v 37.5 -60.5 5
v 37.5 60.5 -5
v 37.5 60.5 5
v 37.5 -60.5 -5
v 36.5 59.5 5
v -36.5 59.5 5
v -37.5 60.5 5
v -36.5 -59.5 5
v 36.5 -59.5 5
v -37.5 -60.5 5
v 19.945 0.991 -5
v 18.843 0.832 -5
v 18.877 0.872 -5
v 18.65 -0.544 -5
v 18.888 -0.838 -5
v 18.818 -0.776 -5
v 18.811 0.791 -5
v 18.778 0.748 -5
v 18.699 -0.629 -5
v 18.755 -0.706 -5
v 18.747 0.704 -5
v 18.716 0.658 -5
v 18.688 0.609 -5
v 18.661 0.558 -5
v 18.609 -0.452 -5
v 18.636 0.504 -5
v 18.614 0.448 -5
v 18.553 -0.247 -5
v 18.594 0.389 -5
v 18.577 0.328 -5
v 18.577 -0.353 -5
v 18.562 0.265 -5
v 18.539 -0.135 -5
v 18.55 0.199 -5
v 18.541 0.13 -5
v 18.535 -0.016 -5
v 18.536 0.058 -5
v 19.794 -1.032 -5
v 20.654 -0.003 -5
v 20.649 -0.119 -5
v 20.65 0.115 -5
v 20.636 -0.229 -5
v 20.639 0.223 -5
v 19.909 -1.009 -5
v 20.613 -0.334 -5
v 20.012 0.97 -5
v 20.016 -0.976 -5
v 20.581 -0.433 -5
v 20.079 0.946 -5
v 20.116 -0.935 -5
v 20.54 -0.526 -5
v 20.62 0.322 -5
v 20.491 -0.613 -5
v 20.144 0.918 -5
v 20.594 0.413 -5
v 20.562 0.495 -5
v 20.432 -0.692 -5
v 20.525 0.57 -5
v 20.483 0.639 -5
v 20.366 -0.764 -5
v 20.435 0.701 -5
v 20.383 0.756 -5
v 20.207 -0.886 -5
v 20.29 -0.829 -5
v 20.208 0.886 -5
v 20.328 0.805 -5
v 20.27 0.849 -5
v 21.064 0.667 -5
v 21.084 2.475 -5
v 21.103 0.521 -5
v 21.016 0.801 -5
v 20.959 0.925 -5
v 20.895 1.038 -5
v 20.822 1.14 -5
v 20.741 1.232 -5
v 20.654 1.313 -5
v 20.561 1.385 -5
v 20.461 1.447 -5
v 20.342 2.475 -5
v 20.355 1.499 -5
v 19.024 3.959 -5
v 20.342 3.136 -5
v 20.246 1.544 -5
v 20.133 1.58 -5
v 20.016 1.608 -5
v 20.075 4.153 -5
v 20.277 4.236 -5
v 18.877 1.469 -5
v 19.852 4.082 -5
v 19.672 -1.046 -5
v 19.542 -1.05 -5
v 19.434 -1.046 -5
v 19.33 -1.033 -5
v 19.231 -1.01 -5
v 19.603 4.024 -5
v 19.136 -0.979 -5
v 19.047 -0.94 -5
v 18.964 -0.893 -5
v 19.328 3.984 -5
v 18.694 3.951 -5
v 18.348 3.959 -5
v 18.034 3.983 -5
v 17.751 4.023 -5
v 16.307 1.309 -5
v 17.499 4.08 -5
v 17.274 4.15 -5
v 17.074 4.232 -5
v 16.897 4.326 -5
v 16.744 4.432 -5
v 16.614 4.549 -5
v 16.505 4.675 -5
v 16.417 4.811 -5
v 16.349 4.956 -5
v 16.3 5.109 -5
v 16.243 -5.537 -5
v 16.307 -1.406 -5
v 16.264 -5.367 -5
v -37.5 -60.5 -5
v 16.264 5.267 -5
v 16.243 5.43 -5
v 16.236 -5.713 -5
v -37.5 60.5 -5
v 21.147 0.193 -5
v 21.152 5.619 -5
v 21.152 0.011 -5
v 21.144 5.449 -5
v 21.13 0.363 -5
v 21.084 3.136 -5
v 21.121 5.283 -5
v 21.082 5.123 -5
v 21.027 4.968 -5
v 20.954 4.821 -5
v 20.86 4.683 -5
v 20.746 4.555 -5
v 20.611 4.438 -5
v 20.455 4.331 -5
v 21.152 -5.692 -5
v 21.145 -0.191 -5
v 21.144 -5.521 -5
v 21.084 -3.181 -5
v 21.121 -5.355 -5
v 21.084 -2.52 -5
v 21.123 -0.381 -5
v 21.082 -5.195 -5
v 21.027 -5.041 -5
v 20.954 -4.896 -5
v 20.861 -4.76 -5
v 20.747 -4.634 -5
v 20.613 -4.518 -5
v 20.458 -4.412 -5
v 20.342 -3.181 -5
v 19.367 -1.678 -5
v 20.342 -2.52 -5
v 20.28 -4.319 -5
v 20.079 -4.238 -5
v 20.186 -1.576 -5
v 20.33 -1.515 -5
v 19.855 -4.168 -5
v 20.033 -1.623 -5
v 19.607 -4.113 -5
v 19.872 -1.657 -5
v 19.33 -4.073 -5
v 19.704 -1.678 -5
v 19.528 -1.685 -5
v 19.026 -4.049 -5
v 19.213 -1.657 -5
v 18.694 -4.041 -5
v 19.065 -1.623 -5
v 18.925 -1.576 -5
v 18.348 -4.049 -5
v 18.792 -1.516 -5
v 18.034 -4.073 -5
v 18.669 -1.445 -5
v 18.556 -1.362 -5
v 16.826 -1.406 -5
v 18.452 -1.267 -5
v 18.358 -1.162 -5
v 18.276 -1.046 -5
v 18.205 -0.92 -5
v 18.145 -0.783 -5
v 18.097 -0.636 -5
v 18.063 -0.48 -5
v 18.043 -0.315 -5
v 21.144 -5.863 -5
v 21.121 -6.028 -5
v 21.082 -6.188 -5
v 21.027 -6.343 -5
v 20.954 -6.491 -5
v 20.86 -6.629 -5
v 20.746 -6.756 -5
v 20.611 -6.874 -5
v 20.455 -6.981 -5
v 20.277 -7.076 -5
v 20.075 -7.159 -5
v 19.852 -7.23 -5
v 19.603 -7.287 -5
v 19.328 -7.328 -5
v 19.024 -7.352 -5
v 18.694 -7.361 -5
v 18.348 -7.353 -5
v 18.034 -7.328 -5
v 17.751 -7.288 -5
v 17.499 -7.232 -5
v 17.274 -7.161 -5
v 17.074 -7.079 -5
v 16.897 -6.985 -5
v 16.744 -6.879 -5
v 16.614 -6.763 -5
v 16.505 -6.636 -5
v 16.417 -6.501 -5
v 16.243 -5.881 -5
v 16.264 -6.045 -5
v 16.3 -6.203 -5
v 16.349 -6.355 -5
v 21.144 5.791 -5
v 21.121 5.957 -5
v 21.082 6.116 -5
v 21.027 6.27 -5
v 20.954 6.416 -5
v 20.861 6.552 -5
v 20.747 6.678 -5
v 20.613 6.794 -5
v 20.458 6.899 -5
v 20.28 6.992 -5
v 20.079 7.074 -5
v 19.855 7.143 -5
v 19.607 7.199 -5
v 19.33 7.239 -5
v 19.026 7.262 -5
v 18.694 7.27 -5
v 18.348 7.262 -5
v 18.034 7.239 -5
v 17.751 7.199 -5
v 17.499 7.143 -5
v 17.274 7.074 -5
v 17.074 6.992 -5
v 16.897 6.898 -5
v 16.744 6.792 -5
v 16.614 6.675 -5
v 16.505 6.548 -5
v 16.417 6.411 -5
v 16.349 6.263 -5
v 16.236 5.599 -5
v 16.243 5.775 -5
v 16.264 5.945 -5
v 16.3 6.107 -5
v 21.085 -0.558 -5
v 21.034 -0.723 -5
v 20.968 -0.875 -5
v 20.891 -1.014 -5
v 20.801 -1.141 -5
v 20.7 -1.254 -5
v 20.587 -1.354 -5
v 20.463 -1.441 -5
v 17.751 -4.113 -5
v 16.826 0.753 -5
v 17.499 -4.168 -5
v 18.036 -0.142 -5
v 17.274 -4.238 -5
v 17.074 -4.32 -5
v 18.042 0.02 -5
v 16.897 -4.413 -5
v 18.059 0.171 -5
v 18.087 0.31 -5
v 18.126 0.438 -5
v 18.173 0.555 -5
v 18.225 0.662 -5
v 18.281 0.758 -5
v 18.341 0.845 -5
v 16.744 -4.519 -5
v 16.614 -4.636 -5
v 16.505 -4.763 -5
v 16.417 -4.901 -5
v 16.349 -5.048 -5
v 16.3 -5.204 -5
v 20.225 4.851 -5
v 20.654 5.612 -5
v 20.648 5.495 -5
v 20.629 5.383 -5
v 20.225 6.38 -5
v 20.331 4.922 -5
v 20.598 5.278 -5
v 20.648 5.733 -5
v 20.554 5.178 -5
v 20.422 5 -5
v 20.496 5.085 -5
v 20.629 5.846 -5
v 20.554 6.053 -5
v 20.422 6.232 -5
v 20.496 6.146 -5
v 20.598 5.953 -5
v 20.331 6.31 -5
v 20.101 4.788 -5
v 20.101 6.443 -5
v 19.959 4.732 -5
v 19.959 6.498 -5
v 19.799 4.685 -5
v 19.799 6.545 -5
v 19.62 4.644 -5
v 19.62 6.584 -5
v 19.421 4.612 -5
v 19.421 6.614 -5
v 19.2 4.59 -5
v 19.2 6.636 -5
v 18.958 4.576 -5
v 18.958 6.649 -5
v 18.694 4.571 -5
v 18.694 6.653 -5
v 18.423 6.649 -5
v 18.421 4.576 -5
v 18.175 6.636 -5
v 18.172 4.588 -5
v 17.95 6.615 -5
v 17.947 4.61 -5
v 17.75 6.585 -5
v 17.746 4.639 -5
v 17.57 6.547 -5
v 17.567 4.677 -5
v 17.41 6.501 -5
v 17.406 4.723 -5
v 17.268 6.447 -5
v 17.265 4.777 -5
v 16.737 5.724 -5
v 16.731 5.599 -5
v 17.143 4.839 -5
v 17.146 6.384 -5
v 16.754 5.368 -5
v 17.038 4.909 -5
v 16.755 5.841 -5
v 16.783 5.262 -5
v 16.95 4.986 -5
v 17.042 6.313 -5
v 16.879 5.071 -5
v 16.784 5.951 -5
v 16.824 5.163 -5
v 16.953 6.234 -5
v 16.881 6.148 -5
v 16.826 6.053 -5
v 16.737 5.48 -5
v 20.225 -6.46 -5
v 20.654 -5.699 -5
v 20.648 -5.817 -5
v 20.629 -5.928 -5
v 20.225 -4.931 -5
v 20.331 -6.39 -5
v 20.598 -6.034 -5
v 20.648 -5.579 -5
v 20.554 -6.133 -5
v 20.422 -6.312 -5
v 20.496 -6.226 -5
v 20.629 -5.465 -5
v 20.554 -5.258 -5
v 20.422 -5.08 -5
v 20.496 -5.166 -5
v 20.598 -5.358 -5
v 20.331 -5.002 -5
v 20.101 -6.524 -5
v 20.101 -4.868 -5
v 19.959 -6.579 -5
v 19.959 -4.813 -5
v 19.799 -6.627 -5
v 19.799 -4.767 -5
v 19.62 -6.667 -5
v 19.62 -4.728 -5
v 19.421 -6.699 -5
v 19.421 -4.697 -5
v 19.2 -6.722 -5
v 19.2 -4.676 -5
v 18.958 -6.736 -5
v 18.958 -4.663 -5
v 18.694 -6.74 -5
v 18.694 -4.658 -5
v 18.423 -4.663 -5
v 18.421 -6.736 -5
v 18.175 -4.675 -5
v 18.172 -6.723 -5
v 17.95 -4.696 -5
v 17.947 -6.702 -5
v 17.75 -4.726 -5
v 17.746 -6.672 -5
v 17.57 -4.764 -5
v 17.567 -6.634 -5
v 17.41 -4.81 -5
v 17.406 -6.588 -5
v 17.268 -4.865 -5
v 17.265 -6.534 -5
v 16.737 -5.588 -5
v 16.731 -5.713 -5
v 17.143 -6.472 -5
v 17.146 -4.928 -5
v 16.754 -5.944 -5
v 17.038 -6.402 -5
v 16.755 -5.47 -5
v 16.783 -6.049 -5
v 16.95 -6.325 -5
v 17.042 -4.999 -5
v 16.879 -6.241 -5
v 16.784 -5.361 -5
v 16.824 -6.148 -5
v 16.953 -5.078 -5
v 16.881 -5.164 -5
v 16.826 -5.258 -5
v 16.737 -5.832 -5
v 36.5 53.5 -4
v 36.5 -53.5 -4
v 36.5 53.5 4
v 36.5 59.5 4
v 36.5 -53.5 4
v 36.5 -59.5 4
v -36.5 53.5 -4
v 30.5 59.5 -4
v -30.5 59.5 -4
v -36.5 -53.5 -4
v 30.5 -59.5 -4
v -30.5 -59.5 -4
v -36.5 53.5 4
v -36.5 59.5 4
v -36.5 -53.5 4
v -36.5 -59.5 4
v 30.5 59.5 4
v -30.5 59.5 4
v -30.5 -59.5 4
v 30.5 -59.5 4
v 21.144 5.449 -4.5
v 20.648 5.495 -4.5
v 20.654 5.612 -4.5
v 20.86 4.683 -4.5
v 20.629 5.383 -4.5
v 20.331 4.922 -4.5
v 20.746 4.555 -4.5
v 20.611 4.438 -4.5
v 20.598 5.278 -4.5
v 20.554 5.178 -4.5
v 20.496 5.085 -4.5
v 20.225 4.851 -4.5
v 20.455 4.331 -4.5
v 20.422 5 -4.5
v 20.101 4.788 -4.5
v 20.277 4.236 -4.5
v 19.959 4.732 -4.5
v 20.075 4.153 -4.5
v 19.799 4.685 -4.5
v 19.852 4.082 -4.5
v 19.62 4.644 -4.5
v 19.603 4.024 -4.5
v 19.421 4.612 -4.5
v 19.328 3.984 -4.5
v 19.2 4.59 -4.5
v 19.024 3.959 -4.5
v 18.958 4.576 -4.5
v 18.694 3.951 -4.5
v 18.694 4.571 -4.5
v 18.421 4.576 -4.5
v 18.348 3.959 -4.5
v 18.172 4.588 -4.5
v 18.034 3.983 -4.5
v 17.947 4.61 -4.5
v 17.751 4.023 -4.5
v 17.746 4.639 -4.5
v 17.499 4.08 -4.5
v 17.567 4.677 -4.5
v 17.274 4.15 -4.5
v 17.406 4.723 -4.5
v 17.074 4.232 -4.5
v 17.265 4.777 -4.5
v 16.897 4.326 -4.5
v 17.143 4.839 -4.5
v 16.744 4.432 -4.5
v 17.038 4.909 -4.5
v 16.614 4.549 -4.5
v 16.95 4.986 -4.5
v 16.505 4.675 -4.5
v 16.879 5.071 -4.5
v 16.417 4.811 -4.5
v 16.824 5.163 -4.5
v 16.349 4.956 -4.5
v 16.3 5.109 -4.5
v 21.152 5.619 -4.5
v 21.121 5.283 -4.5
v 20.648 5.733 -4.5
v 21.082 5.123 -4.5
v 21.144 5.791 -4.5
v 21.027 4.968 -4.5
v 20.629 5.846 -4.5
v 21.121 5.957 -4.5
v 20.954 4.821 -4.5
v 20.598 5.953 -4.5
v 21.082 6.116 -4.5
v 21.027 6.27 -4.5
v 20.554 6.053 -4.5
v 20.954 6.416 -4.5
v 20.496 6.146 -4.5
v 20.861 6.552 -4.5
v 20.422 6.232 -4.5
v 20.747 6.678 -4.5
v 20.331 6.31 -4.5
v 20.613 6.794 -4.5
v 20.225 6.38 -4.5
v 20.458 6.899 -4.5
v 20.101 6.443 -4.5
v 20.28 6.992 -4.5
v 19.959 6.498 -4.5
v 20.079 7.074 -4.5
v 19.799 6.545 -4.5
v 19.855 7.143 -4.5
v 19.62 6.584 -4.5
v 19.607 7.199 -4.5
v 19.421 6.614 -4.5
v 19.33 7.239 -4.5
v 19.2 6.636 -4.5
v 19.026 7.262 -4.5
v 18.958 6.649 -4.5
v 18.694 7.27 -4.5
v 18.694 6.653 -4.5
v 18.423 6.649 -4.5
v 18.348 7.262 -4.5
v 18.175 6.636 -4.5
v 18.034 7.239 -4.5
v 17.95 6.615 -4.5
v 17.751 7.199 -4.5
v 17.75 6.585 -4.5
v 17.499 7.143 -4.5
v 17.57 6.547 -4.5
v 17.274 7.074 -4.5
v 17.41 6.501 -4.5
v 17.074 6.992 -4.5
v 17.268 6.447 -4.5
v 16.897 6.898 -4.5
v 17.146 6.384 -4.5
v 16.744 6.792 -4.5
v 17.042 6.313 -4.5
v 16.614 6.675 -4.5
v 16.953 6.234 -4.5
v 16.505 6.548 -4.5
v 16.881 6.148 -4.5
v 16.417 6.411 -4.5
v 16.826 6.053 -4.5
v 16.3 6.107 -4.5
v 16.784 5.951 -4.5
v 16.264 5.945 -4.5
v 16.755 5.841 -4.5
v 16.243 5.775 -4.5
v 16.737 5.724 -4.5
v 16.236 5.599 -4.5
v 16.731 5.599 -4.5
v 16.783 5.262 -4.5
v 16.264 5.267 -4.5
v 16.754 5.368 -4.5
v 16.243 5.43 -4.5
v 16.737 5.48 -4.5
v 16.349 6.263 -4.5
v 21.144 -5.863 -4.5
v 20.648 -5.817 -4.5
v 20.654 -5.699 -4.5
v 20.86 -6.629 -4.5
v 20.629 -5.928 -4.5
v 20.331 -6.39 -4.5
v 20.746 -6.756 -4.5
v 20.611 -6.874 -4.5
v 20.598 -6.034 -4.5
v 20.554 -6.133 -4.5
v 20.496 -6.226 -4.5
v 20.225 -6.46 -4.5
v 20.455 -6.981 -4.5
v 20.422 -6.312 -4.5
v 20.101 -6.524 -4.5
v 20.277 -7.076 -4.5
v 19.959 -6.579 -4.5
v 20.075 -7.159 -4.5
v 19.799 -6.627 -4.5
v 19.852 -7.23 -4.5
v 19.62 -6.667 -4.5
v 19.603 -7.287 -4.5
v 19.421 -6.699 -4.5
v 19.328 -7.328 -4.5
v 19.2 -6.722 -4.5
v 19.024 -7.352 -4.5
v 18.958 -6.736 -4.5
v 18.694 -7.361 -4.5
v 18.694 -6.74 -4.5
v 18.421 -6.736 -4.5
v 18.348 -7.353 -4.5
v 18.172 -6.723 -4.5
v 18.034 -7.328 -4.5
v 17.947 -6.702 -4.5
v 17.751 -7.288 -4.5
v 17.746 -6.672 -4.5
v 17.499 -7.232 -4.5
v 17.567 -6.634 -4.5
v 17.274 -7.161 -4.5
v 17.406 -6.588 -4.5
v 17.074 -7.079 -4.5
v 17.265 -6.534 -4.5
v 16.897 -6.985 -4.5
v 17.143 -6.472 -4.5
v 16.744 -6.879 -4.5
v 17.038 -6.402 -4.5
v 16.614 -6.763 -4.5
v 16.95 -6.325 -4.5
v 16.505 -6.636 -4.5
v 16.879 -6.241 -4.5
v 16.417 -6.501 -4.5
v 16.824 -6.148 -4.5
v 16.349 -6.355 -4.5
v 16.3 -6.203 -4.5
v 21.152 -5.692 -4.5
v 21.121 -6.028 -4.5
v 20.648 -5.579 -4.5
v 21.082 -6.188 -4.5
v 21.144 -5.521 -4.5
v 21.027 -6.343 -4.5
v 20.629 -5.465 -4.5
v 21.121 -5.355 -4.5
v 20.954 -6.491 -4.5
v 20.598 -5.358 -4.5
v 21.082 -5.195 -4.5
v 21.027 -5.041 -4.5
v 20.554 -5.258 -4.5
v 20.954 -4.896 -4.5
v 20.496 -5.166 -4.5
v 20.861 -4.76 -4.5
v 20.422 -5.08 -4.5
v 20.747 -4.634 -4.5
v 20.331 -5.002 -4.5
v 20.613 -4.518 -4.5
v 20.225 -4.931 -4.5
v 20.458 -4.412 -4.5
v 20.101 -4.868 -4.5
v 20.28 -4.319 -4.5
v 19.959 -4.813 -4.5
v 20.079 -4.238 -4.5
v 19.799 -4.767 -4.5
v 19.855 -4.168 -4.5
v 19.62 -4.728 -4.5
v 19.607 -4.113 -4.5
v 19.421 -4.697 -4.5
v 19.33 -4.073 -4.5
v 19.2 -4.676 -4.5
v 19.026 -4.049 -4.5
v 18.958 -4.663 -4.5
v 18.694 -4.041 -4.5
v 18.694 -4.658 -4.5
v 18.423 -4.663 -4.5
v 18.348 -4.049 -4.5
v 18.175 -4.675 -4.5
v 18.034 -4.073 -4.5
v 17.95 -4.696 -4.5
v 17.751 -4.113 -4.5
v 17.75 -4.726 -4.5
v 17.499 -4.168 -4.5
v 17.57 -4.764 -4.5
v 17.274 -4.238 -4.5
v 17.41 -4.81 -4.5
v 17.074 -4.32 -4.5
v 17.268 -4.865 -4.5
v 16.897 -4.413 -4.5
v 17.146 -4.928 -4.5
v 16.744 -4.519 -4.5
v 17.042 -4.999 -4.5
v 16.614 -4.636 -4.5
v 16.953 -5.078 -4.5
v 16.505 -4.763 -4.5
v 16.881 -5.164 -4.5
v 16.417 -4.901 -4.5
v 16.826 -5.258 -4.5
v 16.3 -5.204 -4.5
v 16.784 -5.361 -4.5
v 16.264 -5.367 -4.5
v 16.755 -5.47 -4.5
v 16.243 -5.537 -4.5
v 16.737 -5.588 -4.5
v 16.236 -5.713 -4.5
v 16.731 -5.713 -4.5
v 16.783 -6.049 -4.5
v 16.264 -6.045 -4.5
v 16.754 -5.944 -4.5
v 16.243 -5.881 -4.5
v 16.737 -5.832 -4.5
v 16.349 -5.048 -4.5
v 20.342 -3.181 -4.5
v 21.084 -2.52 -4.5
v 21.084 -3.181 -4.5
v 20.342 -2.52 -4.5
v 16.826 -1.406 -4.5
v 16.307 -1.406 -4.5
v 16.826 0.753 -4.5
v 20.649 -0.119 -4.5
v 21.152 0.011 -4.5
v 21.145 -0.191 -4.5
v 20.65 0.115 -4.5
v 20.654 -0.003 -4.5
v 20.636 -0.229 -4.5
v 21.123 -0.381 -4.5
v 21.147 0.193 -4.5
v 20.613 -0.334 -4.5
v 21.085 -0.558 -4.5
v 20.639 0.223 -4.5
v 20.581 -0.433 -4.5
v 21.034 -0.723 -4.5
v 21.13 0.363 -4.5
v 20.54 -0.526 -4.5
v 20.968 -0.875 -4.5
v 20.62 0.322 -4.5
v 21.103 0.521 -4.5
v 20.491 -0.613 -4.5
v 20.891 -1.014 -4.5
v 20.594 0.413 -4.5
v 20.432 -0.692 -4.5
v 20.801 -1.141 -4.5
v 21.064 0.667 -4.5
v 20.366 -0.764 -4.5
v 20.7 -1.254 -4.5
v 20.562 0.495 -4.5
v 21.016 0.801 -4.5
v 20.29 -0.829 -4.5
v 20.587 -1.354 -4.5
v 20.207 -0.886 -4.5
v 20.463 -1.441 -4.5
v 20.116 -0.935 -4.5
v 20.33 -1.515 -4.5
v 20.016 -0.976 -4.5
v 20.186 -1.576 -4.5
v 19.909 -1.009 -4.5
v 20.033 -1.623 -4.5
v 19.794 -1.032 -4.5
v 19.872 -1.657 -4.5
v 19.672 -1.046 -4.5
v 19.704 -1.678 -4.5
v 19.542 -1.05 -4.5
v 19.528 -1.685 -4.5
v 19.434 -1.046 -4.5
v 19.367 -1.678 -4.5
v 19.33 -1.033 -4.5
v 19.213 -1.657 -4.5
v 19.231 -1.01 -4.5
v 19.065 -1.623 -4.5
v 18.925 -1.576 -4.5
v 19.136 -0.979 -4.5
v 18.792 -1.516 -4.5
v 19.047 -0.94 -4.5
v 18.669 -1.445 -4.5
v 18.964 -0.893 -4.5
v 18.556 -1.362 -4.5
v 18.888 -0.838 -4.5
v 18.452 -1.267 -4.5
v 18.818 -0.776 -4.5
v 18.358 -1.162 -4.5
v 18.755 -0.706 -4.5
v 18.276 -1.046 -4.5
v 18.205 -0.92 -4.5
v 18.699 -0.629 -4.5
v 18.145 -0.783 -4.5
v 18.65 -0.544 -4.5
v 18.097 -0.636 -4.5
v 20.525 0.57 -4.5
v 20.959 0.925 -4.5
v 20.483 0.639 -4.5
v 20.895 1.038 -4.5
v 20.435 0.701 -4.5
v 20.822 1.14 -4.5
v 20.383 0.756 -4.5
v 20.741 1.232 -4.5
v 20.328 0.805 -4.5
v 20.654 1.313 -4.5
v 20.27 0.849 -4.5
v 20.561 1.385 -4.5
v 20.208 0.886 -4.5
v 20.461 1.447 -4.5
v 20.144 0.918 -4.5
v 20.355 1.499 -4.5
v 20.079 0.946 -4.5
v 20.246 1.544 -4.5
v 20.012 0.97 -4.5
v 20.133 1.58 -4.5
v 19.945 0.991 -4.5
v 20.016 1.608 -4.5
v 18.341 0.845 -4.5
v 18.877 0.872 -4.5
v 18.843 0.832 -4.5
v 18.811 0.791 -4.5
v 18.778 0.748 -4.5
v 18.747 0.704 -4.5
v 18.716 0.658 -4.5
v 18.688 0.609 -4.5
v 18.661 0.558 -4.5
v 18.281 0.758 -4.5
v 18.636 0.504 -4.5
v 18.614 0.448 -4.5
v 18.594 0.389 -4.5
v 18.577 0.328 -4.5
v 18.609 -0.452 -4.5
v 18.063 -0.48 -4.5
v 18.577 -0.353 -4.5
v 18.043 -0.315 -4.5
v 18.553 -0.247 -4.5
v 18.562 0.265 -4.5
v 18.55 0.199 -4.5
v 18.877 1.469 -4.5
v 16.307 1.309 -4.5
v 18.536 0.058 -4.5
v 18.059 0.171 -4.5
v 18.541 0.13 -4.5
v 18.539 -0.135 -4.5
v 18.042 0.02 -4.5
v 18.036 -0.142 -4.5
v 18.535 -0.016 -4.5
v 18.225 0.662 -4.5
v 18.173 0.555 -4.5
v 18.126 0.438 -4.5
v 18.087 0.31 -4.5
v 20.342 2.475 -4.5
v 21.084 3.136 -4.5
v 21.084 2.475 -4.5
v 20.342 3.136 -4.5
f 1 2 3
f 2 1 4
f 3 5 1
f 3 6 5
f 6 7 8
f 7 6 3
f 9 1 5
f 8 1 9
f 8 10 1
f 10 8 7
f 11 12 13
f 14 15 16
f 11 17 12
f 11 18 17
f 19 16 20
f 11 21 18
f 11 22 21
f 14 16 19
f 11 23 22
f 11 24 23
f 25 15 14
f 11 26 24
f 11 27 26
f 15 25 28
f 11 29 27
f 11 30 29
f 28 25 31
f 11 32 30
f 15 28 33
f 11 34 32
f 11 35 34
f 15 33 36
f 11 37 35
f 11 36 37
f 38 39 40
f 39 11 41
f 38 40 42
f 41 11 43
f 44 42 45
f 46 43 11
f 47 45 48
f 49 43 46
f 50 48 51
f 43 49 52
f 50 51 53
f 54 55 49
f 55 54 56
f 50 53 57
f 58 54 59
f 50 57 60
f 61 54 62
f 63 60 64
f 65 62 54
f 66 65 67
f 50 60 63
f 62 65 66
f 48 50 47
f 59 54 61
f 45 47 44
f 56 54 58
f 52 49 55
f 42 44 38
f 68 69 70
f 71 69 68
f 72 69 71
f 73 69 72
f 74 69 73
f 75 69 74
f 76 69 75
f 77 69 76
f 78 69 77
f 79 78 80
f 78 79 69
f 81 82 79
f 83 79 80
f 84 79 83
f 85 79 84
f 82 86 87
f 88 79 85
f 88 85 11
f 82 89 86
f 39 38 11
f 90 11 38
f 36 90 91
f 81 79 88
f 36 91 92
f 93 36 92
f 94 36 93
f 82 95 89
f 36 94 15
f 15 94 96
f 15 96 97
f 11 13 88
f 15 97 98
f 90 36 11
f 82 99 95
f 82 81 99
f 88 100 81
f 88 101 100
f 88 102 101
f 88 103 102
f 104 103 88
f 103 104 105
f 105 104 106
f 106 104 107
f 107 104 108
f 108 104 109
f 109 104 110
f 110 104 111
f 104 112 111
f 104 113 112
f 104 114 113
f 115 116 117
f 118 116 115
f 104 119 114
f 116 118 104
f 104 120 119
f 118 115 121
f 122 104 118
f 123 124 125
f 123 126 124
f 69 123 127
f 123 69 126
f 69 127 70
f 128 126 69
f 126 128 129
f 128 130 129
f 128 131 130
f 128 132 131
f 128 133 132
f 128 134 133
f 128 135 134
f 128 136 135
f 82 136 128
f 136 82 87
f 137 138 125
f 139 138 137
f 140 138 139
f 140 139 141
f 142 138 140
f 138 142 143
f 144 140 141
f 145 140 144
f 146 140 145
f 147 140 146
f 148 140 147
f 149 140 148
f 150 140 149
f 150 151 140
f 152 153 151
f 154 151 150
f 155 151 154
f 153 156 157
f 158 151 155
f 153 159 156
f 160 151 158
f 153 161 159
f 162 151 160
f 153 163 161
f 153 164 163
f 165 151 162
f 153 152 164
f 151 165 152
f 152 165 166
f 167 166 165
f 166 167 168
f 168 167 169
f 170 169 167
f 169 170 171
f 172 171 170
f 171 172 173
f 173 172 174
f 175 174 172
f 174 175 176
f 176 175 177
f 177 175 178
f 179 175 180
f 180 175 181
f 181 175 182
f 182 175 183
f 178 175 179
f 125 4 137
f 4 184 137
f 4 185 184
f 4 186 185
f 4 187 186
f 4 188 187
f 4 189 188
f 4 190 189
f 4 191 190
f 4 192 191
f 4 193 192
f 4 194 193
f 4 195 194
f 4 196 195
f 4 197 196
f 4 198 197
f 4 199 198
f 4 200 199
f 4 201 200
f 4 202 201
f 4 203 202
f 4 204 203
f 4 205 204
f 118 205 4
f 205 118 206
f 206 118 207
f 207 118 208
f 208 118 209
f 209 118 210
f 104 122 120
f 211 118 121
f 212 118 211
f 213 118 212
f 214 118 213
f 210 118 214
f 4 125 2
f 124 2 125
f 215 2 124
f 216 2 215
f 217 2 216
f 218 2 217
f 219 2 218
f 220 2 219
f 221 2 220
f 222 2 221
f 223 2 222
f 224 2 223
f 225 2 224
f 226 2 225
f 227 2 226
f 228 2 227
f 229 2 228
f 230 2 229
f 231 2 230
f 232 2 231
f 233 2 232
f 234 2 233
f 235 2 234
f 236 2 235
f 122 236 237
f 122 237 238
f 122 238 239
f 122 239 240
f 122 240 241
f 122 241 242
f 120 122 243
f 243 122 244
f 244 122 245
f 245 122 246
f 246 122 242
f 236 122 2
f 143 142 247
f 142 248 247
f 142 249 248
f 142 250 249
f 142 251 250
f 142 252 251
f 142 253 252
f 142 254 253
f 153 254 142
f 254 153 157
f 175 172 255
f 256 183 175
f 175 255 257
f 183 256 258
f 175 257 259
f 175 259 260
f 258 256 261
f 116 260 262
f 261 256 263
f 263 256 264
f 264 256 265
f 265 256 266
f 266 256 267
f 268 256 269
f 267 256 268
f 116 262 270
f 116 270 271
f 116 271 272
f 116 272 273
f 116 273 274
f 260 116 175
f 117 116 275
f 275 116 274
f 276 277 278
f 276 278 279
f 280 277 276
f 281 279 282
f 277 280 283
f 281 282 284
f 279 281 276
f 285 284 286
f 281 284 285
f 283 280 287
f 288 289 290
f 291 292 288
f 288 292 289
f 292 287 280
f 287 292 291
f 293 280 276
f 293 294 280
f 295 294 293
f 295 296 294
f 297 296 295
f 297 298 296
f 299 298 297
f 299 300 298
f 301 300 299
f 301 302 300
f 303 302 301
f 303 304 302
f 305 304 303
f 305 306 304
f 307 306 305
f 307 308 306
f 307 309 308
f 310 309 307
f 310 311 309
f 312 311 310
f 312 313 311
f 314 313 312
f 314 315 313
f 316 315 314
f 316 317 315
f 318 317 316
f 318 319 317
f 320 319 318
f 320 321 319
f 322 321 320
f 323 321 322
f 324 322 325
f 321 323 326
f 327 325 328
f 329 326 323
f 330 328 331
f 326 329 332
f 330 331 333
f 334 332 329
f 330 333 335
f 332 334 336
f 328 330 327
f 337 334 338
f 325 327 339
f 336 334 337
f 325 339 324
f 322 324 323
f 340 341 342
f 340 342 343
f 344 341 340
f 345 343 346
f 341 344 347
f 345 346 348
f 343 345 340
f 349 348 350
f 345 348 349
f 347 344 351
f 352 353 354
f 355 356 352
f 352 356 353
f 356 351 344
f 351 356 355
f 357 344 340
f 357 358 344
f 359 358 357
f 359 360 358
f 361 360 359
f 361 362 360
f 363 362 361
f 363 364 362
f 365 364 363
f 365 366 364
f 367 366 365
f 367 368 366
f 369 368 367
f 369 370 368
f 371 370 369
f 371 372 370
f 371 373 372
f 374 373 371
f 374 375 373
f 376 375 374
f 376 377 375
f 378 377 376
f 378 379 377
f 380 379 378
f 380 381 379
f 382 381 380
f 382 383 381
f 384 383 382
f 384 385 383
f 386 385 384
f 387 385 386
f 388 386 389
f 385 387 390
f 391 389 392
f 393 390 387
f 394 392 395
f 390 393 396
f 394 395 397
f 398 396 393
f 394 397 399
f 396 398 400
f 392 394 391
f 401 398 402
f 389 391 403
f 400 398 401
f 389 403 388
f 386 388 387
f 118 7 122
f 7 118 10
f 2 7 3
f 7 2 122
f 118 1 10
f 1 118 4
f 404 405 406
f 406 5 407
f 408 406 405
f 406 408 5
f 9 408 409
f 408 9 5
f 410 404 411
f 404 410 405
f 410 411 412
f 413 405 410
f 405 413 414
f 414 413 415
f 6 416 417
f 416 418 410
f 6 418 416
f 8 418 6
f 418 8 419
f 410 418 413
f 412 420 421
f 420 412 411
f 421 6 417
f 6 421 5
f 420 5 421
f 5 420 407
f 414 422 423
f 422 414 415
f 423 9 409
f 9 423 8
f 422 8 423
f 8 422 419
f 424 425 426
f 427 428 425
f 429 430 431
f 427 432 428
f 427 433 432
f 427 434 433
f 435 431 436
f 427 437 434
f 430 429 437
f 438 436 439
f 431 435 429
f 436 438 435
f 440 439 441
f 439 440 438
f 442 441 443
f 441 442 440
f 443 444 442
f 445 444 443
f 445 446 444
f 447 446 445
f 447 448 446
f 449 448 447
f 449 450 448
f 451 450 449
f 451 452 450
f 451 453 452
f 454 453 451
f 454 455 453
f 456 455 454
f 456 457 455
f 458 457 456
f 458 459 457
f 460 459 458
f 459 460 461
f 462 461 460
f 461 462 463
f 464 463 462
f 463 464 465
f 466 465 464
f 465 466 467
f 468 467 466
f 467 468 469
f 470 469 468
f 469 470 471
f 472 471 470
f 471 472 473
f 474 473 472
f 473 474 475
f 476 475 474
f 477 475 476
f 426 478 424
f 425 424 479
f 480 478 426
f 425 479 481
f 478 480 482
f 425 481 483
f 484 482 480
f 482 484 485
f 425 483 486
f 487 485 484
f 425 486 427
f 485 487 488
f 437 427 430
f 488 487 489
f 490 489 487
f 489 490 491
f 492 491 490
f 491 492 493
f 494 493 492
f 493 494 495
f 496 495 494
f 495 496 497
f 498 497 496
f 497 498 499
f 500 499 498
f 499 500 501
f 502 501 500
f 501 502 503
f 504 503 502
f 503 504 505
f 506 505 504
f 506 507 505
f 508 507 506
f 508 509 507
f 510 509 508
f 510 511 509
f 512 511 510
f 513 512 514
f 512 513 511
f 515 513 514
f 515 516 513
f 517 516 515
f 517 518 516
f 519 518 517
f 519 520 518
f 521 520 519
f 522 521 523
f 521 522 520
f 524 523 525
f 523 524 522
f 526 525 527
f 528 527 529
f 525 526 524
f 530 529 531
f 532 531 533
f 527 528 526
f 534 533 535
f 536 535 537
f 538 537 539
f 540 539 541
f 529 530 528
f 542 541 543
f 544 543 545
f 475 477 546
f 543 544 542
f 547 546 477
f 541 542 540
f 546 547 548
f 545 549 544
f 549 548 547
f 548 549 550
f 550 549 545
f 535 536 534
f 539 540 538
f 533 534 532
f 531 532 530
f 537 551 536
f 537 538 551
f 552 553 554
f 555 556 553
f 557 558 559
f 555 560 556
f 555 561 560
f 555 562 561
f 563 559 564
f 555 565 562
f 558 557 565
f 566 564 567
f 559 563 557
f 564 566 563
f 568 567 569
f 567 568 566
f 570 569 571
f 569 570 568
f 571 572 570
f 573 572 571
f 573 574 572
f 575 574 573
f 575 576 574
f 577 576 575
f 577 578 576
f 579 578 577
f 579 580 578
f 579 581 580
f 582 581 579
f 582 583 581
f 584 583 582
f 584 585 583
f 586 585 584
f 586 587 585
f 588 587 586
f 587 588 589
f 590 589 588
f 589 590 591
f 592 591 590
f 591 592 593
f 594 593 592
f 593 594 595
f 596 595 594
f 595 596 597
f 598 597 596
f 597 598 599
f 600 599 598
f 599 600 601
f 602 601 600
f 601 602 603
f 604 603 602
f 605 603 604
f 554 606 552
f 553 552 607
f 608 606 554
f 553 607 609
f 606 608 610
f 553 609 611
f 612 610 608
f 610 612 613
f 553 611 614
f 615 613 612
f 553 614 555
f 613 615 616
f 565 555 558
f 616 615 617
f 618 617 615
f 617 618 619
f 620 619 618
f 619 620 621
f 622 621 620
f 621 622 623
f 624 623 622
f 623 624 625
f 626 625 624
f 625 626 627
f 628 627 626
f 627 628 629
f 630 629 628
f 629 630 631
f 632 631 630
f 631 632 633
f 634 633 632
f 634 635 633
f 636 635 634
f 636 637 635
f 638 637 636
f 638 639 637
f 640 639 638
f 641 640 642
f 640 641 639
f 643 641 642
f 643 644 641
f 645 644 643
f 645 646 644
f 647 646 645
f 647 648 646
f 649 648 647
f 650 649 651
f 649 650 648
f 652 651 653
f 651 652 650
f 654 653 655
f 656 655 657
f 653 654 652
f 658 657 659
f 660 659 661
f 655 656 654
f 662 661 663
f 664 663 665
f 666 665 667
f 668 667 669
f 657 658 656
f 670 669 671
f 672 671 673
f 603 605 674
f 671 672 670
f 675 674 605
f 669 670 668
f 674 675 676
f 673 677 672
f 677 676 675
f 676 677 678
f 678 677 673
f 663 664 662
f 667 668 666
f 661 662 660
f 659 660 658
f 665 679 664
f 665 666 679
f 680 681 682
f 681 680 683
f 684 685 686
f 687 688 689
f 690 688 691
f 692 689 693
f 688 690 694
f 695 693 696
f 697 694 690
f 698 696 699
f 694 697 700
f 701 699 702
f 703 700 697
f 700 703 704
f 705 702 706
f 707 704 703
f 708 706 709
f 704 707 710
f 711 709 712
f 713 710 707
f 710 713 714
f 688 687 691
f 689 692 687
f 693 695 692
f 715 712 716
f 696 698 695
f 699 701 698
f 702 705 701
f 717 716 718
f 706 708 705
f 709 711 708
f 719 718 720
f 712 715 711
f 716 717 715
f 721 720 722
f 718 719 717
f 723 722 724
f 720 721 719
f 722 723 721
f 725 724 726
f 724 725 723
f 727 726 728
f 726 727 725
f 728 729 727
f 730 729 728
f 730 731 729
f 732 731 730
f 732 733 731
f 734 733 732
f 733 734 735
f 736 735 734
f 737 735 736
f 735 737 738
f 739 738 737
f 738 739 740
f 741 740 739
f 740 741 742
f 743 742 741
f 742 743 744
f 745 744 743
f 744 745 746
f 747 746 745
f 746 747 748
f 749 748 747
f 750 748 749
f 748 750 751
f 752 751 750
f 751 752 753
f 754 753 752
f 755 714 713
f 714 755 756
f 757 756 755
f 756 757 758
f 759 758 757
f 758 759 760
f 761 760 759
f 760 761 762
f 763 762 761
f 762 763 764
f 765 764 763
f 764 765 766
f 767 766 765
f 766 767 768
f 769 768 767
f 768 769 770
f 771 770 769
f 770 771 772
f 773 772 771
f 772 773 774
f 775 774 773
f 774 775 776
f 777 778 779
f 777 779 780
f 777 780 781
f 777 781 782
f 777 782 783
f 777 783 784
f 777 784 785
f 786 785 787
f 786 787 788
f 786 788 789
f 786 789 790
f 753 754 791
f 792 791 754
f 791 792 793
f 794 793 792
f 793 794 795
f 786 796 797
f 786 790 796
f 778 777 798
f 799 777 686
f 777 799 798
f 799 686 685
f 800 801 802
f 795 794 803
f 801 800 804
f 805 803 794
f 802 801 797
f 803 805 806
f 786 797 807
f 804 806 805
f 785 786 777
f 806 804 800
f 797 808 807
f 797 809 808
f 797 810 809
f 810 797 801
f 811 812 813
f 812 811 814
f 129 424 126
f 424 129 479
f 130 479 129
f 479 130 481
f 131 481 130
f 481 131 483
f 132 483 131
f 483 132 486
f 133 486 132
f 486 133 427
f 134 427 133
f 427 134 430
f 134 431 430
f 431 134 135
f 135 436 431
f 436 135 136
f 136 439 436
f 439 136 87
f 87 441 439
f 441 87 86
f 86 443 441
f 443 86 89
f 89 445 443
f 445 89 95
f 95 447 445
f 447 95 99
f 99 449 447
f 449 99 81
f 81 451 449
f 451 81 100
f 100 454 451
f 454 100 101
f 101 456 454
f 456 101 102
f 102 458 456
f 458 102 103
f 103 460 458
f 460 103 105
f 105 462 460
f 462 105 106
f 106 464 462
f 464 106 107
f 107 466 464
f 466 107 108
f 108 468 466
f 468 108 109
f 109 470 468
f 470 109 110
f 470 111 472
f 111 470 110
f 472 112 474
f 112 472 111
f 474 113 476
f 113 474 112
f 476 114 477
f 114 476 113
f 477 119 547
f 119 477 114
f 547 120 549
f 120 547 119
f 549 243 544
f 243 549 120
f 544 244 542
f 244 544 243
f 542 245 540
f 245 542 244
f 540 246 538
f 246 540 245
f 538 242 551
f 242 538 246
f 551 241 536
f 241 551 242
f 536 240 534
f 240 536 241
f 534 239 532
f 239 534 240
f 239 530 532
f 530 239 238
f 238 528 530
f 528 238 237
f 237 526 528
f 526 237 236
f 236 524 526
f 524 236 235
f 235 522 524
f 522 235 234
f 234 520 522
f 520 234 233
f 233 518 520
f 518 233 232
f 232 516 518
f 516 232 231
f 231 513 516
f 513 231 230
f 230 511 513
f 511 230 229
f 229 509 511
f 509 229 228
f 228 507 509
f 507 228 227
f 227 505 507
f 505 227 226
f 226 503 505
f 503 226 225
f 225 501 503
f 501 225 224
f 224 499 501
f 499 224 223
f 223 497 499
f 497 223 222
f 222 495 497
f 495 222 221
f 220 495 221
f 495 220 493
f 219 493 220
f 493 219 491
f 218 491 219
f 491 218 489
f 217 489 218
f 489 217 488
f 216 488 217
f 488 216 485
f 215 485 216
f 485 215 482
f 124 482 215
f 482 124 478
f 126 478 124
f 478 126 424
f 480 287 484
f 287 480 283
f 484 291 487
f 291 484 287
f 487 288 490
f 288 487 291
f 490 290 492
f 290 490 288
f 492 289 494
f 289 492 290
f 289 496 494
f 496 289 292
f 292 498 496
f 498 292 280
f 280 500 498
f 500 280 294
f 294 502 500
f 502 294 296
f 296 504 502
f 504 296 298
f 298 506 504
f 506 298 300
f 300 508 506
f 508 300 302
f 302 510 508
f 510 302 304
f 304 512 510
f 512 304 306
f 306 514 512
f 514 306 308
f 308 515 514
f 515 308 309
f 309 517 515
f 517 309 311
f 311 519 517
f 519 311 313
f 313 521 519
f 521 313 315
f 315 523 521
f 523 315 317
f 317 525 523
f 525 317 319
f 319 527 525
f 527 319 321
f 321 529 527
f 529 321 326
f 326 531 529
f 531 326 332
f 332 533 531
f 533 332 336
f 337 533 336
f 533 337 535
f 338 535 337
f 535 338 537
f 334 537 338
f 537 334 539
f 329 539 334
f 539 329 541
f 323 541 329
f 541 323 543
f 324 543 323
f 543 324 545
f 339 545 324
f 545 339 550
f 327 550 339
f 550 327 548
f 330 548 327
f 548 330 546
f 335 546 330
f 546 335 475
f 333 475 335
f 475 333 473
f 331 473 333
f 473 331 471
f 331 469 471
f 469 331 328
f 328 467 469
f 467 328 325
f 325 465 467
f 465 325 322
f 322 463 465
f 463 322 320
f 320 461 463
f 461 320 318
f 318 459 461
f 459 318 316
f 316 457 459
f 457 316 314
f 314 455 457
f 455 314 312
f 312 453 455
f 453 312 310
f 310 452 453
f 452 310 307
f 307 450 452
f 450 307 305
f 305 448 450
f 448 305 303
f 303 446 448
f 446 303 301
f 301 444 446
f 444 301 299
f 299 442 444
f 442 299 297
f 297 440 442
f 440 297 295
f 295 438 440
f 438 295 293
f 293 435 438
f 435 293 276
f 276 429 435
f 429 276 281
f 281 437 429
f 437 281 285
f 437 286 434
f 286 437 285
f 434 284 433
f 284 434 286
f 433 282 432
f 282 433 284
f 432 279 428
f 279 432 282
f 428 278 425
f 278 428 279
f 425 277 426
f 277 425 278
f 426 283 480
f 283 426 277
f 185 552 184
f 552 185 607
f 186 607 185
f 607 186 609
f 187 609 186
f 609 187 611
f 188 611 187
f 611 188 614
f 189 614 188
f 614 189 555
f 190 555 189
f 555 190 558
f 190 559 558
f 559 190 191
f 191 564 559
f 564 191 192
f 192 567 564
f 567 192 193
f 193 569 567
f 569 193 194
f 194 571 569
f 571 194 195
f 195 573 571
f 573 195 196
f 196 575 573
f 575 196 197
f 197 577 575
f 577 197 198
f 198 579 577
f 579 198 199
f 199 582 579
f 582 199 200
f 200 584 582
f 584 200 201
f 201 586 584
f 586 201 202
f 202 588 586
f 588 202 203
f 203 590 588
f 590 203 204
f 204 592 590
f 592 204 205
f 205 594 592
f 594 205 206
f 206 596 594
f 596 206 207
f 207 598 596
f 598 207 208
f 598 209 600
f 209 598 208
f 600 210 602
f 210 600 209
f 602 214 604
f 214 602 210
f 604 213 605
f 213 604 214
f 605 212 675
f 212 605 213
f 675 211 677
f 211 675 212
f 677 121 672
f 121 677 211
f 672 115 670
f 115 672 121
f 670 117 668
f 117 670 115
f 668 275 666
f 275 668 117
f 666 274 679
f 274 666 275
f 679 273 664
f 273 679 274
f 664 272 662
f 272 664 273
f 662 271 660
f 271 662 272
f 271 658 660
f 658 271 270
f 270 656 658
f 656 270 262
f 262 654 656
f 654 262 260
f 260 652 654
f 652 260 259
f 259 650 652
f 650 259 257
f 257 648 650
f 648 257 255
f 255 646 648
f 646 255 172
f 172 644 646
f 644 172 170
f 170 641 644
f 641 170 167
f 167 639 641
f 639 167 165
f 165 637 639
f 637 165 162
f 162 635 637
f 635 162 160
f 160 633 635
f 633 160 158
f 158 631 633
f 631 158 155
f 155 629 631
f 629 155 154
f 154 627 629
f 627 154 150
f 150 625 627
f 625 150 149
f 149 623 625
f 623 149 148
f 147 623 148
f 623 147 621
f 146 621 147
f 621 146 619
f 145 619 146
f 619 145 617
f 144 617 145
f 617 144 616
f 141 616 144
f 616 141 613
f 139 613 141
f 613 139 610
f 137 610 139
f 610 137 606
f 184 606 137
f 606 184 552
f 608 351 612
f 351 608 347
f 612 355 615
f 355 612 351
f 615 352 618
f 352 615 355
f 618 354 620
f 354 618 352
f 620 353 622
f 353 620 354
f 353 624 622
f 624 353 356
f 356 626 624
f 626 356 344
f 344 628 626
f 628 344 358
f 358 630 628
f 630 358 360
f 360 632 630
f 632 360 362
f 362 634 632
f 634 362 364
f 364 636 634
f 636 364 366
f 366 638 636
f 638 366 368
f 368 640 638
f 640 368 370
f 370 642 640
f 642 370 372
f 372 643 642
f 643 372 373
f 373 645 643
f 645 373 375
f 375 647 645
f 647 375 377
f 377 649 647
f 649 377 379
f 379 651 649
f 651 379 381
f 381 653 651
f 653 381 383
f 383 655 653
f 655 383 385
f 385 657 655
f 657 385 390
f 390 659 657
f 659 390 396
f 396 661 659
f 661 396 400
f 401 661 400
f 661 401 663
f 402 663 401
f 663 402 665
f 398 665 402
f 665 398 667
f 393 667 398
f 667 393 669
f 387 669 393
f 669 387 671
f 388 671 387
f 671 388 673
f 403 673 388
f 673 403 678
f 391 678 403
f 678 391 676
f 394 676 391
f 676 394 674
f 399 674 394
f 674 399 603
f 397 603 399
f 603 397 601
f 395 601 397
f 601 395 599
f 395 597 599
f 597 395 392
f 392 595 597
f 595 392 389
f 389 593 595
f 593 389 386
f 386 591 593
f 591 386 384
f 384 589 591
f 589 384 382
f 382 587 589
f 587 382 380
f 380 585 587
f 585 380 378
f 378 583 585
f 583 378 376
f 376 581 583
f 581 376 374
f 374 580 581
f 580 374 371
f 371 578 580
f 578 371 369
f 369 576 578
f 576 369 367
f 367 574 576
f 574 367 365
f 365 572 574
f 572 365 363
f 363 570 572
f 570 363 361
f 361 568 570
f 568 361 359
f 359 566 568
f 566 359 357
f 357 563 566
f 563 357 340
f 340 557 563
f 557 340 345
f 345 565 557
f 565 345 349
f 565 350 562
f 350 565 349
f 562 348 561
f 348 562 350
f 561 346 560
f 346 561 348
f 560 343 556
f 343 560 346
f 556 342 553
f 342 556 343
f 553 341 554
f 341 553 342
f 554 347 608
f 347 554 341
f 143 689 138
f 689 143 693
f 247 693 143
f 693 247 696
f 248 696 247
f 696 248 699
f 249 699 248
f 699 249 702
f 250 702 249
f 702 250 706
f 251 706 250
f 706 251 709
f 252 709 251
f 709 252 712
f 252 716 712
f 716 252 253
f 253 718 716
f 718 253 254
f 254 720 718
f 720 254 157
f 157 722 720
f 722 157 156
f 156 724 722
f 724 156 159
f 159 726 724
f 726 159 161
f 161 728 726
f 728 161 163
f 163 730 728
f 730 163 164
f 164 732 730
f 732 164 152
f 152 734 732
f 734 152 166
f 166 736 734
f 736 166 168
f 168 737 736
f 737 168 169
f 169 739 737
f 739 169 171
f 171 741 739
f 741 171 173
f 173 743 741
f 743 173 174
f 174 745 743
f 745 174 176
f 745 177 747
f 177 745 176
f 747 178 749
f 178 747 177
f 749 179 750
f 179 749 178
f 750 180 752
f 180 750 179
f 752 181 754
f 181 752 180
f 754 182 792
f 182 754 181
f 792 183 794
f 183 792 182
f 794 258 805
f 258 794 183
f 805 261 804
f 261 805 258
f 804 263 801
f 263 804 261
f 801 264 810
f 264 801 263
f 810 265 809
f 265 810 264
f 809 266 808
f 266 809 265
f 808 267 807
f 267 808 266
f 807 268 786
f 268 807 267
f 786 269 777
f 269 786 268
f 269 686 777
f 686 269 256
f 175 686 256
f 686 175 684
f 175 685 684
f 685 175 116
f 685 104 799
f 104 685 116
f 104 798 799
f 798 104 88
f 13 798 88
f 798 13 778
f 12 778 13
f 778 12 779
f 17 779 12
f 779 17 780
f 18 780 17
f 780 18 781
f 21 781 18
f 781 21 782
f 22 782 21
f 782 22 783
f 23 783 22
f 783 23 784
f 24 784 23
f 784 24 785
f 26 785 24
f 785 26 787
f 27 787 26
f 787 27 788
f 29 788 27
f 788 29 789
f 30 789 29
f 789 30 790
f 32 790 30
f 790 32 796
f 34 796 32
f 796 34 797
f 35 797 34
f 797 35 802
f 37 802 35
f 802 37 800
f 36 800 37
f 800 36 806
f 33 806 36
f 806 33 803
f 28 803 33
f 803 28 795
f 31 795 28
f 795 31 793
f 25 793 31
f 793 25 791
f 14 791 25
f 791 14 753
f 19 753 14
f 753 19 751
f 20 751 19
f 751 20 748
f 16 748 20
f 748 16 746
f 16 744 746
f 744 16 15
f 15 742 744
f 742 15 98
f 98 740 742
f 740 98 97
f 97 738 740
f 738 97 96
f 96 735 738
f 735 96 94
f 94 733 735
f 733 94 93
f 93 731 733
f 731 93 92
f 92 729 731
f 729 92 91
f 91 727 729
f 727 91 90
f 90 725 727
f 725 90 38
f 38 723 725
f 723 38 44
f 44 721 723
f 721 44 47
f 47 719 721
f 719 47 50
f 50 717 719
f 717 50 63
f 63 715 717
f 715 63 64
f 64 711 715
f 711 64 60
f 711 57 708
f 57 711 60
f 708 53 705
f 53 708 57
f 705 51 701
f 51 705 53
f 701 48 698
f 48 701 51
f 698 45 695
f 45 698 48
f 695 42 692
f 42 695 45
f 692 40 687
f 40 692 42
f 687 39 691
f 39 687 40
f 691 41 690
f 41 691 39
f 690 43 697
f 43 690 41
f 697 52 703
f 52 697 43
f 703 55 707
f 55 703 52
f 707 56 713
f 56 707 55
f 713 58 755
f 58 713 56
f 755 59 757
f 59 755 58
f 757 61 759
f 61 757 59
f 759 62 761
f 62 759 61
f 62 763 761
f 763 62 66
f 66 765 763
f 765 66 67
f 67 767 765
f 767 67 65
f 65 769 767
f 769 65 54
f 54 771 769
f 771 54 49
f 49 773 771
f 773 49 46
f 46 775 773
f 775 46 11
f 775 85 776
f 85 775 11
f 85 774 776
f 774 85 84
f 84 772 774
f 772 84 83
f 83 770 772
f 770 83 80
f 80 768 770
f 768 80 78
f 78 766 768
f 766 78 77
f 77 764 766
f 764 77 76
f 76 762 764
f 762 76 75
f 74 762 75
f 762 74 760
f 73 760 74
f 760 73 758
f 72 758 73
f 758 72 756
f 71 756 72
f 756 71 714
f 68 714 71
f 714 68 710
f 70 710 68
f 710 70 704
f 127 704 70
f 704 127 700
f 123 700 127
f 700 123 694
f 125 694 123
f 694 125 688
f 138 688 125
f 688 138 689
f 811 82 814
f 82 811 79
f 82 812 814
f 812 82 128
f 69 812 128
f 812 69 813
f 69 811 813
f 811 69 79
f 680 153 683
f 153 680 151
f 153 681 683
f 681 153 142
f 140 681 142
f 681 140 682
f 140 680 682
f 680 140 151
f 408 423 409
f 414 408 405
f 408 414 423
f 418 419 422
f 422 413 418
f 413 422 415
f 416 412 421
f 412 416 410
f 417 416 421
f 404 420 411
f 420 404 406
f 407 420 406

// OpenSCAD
version = "0.5.0";

function toUnits(inches=0, sixteenths=0) = (inches * 16) + sixteenths;

playerBoardWidth = toUnits(4,8);
playerBoardLength = toUnits(7,6);

cutoutSide = 6;
cutoutHypotenuse = 8.5;

stackDepth = 8;

intruderBoardWidth = playerBoardWidth;
intruderBoardLength = toUnits(7,4);

voidDepth = stackDepth;
voidWidth = playerBoardWidth + 1;
voidLength = playerBoardLength + 1;

shellDepth = voidDepth + 2 ;
shellWidth = voidWidth + 2;
shellLength = voidLength + 2;

module cornerCutout() {
    linear_extrude (stackDepth) {
    polygon( points = [ [0,0], [0,cutoutSide],  [cutoutSide,0]]);
    }
}

difference() {
    cube ([shellWidth, shellLength, shellDepth], true);
    translate ([0,0,1]) cube ([voidWidth, voidLength, voidDepth+ 2], true);
    
    translate ([shellWidth / 4, 0, - (shellDepth / 2) + 0.5])
    rotate ([0,180,90])
        linear_extrude (1) {
            scale (.5, .5, .5)
            text(version, halign = "center", valign = "center");
        } ;
}



translate ([voidWidth/2 , - voidLength/2 ,-(voidDepth /2) ]) rotate (90) cornerCutout();
translate ([-(voidWidth/2) ,  -voidLength/2 ,-(voidDepth /2) ]) rotate (0) cornerCutout();
translate ([-voidWidth/2 ,  voidLength/2 ,-(voidDepth /2) ]) rotate (270) cornerCutout();
translate ([voidWidth/2 ,  voidLength/2 ,-(voidDepth /2) ]) rotate (180) cornerCutout();

// validate that the intruder board fits as expected 
// translate ([0,0,voidDepth/2]) cube ([intruderBoardWidth, intruderBoardLength, 1], true);
